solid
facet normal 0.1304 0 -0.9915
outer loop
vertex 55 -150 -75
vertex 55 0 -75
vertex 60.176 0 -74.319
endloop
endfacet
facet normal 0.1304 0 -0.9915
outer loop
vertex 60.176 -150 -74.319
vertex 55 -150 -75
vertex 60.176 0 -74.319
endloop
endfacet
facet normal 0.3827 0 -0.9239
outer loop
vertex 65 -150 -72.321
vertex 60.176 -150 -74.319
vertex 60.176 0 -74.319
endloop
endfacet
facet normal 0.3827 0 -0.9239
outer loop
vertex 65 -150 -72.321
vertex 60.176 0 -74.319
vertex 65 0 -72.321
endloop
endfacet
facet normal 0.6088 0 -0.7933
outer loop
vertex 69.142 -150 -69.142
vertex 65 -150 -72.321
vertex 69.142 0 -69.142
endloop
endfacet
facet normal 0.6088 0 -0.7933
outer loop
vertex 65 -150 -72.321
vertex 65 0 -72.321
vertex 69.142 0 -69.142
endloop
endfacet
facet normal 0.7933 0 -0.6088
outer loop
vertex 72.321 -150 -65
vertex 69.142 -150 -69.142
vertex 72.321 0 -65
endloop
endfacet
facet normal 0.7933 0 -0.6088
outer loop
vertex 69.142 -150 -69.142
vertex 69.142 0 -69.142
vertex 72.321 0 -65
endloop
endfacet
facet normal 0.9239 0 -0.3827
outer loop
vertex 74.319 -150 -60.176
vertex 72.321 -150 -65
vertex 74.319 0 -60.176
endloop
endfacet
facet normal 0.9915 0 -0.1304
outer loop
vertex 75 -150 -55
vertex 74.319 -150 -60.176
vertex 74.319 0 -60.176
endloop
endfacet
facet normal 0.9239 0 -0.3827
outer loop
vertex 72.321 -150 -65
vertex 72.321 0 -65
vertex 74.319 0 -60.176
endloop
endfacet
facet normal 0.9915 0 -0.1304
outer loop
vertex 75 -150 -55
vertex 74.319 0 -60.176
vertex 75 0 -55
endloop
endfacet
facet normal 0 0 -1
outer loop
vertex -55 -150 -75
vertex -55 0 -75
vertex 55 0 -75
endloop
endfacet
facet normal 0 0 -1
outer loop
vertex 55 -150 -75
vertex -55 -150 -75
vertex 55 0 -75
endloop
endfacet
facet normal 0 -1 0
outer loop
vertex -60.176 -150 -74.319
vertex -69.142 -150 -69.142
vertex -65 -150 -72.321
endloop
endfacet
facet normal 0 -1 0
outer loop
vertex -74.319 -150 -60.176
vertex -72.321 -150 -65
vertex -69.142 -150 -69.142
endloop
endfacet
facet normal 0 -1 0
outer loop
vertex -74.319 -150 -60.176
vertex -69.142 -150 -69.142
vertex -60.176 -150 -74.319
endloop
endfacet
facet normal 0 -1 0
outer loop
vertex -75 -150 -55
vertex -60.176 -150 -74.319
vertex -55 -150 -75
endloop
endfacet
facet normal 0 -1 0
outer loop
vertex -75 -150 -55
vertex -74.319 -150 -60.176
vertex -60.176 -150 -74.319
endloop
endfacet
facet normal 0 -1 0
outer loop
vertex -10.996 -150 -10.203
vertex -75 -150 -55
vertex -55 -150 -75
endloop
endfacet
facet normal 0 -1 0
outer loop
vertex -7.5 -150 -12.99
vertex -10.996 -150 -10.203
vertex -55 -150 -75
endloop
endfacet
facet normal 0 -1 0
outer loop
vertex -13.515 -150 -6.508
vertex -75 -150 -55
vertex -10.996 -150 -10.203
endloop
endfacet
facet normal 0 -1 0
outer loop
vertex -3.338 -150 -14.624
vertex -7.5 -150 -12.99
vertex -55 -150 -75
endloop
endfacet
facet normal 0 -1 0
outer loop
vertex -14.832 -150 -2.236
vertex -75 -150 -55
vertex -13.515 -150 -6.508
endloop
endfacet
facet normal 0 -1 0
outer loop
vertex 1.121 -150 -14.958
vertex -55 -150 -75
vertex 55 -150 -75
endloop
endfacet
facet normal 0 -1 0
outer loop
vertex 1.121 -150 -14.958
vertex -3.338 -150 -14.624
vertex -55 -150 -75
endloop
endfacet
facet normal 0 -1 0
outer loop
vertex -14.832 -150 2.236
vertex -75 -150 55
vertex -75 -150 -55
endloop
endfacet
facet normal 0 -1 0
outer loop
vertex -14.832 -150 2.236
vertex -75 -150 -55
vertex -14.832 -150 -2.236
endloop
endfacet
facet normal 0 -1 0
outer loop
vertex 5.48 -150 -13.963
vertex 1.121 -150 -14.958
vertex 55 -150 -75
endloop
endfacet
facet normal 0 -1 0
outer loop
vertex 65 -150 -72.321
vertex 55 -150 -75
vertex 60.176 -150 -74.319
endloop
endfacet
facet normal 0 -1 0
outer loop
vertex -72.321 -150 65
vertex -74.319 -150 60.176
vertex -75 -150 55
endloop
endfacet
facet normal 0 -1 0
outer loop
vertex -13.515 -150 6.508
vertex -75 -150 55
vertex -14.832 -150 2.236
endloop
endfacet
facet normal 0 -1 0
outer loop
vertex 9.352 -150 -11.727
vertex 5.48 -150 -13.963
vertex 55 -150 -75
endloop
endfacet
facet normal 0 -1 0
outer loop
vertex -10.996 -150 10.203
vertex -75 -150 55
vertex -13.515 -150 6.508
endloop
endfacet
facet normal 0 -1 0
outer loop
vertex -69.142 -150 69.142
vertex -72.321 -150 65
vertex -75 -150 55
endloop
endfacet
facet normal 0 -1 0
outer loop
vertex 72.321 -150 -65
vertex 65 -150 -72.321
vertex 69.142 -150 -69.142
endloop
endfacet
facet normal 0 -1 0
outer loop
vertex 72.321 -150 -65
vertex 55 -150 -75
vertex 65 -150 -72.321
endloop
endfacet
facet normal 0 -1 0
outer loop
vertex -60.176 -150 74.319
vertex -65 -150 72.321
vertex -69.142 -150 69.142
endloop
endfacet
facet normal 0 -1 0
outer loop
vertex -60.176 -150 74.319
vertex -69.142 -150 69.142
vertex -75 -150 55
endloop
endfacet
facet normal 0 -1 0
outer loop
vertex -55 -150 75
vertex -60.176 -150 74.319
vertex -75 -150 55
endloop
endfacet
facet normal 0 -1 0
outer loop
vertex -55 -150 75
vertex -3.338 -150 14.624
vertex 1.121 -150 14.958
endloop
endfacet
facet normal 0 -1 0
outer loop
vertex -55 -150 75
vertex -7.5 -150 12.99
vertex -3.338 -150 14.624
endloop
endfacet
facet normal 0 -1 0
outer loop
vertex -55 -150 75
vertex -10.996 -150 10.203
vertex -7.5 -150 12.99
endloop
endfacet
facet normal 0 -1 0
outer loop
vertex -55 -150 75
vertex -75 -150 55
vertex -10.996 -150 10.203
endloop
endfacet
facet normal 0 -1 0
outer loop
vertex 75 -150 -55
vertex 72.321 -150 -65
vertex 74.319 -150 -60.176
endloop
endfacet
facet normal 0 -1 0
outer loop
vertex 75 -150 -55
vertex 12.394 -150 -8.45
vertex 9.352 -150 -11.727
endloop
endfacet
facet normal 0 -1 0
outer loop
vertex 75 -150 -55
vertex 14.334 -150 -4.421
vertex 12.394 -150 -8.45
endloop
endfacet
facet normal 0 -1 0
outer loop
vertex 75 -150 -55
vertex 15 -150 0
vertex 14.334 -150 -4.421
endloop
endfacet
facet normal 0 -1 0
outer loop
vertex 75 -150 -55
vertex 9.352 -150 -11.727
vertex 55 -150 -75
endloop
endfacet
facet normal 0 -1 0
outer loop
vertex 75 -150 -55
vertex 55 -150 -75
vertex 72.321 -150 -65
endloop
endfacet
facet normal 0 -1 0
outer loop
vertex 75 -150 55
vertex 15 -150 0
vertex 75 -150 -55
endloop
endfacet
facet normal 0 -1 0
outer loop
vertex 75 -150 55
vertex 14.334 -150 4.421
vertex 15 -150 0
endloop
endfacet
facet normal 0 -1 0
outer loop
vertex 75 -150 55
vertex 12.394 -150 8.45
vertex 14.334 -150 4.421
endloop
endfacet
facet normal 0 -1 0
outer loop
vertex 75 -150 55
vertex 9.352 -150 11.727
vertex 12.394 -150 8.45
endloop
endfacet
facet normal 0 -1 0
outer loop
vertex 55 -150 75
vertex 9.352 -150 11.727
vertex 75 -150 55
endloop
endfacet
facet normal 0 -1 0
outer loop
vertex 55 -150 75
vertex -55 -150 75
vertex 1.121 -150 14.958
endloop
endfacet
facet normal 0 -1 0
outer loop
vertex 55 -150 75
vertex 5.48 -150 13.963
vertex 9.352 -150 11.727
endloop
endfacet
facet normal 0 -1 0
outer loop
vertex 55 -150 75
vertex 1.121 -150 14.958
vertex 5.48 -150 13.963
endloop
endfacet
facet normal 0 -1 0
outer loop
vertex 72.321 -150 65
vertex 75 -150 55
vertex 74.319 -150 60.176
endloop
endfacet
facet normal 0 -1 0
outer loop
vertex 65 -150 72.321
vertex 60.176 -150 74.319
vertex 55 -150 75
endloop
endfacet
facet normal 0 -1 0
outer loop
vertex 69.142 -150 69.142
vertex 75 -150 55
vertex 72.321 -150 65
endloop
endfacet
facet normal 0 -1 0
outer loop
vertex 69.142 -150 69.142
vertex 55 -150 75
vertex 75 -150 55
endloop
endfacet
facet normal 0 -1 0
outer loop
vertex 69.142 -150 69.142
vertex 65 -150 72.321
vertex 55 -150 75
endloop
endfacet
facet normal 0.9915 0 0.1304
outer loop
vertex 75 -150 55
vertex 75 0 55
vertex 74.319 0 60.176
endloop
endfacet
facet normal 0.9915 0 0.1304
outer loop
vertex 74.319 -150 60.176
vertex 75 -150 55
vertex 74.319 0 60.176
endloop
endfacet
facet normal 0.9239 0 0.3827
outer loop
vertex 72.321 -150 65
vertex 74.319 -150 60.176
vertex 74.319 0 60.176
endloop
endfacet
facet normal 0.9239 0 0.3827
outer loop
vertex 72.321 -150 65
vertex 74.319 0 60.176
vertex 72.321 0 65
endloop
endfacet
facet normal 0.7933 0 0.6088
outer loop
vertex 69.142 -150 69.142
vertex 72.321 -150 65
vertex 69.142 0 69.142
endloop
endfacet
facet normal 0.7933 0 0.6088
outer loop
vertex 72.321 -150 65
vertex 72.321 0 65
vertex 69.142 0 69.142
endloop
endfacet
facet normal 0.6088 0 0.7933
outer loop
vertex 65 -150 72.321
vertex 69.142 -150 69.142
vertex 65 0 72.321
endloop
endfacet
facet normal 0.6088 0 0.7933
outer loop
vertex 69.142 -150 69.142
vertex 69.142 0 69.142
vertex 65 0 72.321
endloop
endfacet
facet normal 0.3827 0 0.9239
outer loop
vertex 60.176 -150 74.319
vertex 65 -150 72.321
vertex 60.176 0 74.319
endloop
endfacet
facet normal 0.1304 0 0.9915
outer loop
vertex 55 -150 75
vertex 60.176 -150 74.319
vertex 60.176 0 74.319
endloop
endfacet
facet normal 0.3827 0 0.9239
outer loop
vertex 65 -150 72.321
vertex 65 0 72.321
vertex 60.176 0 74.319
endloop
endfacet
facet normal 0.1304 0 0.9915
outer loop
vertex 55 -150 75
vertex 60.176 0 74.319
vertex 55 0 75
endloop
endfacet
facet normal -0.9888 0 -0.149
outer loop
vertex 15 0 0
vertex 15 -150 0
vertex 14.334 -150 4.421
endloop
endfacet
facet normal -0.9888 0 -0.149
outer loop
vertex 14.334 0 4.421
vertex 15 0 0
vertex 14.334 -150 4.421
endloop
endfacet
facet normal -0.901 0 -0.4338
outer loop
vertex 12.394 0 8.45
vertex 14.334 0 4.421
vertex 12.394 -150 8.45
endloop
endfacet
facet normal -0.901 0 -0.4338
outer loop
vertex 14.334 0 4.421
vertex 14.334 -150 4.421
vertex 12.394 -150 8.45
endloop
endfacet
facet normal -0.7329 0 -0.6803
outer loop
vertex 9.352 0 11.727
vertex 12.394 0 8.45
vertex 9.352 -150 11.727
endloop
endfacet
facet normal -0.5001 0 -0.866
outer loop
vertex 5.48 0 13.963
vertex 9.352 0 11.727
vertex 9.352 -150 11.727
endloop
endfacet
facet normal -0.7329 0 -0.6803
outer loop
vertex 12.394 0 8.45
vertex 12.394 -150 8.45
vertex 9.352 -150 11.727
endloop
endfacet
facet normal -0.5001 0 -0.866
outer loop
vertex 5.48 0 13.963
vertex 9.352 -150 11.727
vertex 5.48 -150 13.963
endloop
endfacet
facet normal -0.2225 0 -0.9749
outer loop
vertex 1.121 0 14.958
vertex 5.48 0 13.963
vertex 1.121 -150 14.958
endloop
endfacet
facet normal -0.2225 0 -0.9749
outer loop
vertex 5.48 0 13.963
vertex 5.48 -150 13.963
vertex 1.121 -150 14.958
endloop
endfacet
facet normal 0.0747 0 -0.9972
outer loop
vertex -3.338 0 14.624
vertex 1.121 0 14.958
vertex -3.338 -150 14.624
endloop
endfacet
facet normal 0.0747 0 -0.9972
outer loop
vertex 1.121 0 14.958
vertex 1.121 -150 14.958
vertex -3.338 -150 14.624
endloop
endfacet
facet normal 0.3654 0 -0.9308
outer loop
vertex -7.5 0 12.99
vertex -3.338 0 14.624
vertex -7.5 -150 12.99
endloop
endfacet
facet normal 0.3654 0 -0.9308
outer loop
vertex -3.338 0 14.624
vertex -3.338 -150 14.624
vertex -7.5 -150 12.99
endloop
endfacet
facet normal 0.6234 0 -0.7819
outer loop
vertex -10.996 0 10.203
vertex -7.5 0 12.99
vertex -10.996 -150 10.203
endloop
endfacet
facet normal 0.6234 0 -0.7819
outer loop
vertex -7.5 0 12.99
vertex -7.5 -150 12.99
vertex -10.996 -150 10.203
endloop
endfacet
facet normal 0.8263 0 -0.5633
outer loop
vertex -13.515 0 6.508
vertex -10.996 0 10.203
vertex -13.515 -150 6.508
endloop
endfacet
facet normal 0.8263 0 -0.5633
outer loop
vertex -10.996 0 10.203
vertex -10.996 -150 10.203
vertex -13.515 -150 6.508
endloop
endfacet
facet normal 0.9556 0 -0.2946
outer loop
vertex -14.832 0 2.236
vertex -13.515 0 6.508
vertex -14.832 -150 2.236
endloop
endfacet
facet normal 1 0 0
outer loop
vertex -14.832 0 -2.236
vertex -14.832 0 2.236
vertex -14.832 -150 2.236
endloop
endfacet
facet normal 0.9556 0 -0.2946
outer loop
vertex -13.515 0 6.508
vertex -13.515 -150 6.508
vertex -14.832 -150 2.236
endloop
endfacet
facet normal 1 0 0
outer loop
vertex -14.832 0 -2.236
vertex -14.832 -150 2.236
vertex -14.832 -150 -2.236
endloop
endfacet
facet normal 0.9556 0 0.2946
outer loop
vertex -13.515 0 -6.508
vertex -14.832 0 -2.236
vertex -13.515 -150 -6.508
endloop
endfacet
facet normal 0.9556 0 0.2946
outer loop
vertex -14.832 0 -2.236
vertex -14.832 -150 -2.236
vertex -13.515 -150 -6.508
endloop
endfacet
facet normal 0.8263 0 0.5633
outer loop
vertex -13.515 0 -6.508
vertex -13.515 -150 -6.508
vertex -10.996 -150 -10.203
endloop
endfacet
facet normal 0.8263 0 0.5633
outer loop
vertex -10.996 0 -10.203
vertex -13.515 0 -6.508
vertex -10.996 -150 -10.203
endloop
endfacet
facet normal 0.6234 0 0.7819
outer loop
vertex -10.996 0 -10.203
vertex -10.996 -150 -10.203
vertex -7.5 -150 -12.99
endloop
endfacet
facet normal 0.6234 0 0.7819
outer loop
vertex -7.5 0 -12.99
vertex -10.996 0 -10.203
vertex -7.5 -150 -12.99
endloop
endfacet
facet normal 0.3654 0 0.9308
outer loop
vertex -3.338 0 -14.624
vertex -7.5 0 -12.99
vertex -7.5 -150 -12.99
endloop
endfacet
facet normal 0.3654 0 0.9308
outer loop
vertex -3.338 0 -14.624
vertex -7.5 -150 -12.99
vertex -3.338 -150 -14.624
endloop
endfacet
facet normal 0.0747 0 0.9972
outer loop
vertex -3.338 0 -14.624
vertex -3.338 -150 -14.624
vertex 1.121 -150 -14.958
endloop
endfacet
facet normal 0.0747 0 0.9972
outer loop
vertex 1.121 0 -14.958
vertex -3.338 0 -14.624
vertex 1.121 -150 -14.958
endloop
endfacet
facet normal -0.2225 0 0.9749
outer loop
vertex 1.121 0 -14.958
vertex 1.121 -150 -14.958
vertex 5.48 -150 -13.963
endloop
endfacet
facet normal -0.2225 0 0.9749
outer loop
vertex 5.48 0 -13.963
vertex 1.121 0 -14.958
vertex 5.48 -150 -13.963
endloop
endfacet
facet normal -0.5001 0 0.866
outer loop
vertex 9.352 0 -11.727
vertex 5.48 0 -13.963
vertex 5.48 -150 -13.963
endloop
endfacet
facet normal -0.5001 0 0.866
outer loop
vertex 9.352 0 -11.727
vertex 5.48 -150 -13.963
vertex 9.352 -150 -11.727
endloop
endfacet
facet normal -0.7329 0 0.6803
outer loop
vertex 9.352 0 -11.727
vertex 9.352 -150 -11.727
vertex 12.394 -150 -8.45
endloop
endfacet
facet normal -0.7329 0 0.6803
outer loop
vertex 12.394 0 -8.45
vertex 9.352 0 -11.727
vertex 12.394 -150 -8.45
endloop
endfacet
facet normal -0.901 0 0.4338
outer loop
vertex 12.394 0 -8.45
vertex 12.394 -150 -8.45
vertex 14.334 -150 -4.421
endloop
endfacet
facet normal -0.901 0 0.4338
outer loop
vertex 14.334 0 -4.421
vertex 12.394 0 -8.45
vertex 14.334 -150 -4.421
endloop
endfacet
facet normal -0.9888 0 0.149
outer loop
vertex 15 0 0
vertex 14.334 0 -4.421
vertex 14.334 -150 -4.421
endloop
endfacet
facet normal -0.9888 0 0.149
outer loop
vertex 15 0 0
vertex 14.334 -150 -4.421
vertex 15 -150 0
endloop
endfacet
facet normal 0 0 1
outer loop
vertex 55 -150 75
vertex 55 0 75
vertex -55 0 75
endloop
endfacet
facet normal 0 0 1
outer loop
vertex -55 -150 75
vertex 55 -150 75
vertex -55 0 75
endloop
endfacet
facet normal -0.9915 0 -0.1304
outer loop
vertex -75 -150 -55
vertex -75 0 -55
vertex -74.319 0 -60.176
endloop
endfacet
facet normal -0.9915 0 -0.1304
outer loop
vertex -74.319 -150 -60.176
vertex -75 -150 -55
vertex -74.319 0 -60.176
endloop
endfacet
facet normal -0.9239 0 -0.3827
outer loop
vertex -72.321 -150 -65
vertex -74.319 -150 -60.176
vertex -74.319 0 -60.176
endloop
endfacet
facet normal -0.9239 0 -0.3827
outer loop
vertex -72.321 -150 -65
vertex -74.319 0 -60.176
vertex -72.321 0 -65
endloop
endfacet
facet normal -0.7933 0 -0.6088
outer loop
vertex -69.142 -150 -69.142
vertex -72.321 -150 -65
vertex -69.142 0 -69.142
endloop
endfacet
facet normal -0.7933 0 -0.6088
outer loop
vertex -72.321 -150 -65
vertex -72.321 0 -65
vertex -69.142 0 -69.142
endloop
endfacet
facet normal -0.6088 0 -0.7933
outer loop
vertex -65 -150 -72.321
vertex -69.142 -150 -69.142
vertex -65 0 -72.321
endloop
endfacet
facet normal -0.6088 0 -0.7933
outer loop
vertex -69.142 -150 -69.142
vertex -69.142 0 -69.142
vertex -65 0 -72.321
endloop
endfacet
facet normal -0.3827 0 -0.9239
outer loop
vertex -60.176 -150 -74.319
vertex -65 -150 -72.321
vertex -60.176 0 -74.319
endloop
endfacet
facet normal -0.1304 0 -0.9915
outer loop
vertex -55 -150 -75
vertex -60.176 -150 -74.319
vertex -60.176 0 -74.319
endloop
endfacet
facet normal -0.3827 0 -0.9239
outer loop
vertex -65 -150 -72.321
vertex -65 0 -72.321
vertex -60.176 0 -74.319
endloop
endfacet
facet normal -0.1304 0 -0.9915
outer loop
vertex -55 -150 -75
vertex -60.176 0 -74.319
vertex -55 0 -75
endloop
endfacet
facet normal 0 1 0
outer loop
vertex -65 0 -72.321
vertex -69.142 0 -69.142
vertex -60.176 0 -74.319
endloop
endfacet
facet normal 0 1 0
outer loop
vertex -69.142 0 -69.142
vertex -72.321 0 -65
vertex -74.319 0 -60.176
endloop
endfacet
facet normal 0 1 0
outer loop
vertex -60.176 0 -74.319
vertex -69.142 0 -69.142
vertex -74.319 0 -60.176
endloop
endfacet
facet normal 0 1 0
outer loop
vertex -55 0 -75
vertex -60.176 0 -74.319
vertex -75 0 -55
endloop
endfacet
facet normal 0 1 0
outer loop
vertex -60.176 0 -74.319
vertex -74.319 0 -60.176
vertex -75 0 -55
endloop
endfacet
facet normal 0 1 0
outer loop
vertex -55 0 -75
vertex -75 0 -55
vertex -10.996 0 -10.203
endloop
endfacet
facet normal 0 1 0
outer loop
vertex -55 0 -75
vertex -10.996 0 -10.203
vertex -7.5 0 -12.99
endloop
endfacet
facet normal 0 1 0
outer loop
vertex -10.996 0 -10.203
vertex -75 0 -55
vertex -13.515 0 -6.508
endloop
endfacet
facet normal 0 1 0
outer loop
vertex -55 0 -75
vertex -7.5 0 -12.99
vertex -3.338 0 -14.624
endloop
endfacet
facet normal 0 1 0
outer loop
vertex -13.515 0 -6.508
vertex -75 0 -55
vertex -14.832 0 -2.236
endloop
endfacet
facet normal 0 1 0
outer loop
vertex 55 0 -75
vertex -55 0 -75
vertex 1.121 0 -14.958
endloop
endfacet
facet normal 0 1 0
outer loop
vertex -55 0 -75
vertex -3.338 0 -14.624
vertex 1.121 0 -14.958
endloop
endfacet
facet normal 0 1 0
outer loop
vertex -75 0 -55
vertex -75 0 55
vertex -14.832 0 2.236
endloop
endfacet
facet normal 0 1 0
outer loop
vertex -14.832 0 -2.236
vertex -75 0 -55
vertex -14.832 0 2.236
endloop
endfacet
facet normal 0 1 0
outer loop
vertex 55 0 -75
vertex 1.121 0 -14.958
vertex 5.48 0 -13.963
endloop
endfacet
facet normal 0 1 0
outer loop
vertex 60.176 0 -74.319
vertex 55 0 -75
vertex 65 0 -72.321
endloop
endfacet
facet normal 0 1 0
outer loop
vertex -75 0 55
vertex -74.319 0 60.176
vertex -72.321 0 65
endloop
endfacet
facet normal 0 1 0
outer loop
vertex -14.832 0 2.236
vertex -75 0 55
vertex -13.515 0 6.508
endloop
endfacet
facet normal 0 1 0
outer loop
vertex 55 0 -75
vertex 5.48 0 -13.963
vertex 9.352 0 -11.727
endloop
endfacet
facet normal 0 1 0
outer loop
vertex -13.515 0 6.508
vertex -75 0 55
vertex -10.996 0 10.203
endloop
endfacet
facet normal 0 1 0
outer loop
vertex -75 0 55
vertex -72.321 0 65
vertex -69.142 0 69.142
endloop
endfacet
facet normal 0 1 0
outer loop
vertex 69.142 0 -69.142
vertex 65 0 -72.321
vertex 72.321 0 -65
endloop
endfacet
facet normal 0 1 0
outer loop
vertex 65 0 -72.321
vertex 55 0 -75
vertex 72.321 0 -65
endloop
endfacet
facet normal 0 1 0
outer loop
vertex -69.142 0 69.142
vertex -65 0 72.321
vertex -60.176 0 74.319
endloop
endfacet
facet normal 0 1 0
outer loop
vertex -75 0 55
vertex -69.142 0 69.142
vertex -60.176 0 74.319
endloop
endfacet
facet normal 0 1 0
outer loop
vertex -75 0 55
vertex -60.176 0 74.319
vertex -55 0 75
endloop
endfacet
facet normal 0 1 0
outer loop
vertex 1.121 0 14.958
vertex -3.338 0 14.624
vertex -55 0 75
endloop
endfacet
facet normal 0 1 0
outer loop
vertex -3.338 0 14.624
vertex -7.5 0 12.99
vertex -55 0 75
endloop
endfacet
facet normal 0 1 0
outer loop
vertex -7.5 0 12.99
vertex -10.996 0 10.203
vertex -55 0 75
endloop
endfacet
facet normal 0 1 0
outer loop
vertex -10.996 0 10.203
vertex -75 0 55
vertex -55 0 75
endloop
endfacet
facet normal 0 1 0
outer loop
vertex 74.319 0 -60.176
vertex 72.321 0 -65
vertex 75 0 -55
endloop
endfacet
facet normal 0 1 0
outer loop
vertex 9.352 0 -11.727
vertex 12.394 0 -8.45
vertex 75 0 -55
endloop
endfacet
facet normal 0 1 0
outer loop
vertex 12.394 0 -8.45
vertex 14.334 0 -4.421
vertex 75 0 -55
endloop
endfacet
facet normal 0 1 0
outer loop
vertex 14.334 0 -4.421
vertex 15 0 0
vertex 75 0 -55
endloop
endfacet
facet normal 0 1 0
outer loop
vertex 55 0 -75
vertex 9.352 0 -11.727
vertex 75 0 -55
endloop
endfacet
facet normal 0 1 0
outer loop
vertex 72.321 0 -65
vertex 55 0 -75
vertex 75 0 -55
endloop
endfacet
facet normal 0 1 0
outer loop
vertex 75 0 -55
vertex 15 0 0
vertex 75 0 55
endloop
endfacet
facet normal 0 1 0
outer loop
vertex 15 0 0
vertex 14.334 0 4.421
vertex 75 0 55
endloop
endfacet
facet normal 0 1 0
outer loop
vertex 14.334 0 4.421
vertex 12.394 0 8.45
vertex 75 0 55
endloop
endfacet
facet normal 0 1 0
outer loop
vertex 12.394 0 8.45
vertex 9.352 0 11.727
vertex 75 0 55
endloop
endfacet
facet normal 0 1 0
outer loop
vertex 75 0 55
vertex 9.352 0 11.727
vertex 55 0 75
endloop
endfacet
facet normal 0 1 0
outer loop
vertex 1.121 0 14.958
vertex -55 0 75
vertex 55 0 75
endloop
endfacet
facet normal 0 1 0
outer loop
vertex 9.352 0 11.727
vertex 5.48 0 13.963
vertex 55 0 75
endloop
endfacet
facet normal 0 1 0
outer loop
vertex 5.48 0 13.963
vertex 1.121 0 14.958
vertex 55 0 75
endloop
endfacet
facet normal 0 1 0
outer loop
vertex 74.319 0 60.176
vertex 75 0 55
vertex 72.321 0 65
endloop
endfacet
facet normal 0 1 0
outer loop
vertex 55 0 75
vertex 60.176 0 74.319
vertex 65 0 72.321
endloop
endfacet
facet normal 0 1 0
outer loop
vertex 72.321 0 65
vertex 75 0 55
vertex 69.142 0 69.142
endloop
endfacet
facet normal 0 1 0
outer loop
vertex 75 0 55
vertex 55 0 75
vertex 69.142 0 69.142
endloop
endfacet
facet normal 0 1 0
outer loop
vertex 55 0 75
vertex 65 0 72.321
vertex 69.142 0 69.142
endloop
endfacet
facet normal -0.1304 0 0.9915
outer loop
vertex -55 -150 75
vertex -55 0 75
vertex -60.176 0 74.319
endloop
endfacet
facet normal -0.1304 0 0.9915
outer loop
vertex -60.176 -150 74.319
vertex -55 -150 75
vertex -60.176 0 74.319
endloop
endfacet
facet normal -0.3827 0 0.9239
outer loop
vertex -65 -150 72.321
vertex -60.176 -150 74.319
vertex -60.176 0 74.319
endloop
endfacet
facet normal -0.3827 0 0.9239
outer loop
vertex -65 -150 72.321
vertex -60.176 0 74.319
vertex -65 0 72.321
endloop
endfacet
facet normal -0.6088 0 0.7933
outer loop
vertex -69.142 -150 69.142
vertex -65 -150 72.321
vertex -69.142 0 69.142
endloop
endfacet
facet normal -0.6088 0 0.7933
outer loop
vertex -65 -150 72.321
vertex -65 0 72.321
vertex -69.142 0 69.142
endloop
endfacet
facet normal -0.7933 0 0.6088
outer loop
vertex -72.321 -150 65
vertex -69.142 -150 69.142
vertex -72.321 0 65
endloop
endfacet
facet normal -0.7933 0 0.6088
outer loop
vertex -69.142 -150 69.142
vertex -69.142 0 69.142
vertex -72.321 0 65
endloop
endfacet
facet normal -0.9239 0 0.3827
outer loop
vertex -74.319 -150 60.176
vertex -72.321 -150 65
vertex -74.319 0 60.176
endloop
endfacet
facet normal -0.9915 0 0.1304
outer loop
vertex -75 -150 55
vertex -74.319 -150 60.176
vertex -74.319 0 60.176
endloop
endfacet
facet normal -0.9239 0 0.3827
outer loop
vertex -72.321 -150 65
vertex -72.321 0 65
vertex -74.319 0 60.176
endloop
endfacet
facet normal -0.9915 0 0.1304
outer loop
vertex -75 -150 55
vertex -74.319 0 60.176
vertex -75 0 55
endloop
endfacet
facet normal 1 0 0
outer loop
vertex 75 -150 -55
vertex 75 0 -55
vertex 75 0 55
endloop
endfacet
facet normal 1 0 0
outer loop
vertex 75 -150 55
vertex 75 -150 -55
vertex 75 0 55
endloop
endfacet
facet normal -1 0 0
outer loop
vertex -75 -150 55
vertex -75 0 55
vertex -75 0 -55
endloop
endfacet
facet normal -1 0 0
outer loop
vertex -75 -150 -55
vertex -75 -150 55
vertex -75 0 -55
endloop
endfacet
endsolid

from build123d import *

# Parameters (mm, degrees)
F1_DEPTH = 150
F2_R     = 15
F3_DEPTH = 150.001


with BuildPart() as f1:
    # F0 (on Front) → F1 (new body)
    with BuildSketch(Plane.XZ):
        with BuildLine():
            Line((55, 75), (-55, 75))
            ThreePointArc((-55, 75), (-69.142136, 69.142136), (-75, 55))
            Line((-75, 55), (-75, -55))
            ThreePointArc((-75, -55), (-69.142136, -69.142136), (-55, -75))
            Line((-55, -75), (55, -75))
            ThreePointArc((55, -75), (69.142136, -69.142136), (75, -55))
            Line((75, -55), (75, 55))
            ThreePointArc((75, 55), (69.142136, 69.142136), (55, 75))
        make_face()
    extrude(amount=F1_DEPTH)

    # F2 (on face) → F3 (cut, through all)
    with BuildSketch(Plane.XZ.offset(150)):
        Circle(F2_R)
    extrude(amount=-F3_DEPTH, mode=Mode.SUBTRACT)


solid = f1.part
